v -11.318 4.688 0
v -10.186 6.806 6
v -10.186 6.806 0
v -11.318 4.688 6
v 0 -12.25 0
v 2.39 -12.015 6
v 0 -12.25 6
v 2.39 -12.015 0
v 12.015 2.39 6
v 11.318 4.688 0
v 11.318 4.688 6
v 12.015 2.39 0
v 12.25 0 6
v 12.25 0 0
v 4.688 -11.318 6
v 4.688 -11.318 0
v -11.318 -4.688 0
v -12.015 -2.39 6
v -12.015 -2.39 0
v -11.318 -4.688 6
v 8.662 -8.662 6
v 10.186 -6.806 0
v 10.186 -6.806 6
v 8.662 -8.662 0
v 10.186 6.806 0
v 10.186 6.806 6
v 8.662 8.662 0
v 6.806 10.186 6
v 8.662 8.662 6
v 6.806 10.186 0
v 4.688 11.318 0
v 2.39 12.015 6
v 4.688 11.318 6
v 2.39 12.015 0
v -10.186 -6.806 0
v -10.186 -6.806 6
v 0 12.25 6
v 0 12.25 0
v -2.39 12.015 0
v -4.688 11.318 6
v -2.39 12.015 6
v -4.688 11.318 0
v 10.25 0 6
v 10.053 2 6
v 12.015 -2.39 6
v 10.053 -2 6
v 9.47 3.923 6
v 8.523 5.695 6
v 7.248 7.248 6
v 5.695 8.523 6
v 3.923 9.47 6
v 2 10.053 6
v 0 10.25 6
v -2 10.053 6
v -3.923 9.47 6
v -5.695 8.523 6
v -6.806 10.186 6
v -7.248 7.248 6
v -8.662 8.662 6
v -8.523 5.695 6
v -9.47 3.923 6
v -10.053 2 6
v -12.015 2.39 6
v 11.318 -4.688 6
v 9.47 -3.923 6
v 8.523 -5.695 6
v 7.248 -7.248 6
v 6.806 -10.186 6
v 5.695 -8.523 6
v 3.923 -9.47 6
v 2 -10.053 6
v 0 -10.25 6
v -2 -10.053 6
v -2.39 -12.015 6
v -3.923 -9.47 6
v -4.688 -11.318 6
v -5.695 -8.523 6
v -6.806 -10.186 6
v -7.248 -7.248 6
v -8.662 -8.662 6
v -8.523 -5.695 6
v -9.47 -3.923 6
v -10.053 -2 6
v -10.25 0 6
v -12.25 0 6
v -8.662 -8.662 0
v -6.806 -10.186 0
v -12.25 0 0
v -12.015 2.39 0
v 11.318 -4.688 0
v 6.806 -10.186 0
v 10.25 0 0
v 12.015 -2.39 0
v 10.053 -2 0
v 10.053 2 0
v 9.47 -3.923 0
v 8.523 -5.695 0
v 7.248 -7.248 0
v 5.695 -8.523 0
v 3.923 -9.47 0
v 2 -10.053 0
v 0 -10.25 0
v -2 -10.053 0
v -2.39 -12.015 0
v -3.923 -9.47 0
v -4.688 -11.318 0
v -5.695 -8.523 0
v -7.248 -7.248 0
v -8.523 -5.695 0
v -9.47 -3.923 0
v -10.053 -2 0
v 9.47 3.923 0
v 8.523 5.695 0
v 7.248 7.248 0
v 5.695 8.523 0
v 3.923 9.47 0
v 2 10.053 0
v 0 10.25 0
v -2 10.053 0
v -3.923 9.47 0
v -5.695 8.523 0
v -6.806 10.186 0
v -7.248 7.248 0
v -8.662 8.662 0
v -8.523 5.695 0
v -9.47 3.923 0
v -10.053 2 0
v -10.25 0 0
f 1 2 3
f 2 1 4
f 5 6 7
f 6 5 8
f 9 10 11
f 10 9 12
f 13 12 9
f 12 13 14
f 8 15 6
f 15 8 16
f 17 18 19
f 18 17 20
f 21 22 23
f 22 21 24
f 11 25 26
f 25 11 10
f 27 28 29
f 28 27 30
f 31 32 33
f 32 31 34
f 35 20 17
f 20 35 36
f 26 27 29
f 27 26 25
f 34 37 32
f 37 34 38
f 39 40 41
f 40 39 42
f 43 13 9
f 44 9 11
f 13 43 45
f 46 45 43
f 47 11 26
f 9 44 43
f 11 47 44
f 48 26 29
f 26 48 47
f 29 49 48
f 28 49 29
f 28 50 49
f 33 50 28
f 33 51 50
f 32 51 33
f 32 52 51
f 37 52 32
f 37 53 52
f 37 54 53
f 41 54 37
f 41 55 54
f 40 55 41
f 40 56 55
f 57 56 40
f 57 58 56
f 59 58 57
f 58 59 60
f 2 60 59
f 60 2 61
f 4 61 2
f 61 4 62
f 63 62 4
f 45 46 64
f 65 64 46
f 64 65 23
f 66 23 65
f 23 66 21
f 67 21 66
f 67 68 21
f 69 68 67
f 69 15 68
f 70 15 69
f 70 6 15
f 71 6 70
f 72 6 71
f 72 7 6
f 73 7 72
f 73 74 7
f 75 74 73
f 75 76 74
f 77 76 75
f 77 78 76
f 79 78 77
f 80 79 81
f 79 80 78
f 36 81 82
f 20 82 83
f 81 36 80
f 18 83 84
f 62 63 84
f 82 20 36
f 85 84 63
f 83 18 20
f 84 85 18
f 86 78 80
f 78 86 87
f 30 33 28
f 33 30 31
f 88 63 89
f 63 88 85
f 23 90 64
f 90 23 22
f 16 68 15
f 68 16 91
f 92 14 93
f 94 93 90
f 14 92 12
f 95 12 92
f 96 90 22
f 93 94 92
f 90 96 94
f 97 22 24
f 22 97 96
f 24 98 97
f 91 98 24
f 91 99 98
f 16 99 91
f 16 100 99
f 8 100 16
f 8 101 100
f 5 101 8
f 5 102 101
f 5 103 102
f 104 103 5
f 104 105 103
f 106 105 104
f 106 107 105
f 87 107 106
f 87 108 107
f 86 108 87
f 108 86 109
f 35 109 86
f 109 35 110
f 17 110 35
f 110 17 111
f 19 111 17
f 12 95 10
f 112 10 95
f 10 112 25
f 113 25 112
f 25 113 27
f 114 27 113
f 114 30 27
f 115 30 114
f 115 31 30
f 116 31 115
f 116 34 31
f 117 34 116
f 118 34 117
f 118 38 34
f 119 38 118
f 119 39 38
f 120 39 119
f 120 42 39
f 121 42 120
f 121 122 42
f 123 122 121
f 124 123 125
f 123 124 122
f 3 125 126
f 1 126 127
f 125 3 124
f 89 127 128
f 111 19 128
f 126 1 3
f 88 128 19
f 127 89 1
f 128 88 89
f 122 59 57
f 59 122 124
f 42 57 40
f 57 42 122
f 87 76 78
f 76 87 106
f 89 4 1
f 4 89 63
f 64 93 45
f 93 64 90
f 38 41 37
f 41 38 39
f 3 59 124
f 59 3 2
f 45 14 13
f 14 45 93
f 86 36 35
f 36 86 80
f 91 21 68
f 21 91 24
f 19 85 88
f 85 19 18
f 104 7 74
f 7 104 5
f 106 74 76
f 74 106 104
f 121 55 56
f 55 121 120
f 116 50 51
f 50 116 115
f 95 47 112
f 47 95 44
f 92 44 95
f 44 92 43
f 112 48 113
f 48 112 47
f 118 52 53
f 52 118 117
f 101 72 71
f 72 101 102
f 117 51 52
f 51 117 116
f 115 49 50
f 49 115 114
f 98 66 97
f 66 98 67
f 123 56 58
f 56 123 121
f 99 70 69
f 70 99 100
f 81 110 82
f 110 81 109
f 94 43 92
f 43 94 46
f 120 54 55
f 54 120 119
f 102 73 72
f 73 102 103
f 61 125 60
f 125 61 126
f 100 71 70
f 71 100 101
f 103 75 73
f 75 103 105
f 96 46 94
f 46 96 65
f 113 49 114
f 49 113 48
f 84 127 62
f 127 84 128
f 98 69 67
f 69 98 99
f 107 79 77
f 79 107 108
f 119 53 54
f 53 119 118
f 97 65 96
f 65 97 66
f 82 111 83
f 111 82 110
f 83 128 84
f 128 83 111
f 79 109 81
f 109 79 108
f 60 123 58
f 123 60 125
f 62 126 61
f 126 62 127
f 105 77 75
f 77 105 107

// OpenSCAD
$fn = 32;

// ----------------------------------------------------------------------
// Spacer sleeve: 24.5 / 20.5 x 6 mm
// ----------------------------------------------------------------------

// --- parameters (mm) ---
sleeve_od = 24.5;         // outside diameter
sleeve_id = 20.5;         // shaft bore
sleeve_l = 6;             // sleeve length

module sleeve() {
  cylinder(h = sleeve_l, d = sleeve_od);
}

difference() {
  sleeve();
  translate([0, 0, -1]) cylinder(h = sleeve_l + 2, d = sleeve_id);
}
